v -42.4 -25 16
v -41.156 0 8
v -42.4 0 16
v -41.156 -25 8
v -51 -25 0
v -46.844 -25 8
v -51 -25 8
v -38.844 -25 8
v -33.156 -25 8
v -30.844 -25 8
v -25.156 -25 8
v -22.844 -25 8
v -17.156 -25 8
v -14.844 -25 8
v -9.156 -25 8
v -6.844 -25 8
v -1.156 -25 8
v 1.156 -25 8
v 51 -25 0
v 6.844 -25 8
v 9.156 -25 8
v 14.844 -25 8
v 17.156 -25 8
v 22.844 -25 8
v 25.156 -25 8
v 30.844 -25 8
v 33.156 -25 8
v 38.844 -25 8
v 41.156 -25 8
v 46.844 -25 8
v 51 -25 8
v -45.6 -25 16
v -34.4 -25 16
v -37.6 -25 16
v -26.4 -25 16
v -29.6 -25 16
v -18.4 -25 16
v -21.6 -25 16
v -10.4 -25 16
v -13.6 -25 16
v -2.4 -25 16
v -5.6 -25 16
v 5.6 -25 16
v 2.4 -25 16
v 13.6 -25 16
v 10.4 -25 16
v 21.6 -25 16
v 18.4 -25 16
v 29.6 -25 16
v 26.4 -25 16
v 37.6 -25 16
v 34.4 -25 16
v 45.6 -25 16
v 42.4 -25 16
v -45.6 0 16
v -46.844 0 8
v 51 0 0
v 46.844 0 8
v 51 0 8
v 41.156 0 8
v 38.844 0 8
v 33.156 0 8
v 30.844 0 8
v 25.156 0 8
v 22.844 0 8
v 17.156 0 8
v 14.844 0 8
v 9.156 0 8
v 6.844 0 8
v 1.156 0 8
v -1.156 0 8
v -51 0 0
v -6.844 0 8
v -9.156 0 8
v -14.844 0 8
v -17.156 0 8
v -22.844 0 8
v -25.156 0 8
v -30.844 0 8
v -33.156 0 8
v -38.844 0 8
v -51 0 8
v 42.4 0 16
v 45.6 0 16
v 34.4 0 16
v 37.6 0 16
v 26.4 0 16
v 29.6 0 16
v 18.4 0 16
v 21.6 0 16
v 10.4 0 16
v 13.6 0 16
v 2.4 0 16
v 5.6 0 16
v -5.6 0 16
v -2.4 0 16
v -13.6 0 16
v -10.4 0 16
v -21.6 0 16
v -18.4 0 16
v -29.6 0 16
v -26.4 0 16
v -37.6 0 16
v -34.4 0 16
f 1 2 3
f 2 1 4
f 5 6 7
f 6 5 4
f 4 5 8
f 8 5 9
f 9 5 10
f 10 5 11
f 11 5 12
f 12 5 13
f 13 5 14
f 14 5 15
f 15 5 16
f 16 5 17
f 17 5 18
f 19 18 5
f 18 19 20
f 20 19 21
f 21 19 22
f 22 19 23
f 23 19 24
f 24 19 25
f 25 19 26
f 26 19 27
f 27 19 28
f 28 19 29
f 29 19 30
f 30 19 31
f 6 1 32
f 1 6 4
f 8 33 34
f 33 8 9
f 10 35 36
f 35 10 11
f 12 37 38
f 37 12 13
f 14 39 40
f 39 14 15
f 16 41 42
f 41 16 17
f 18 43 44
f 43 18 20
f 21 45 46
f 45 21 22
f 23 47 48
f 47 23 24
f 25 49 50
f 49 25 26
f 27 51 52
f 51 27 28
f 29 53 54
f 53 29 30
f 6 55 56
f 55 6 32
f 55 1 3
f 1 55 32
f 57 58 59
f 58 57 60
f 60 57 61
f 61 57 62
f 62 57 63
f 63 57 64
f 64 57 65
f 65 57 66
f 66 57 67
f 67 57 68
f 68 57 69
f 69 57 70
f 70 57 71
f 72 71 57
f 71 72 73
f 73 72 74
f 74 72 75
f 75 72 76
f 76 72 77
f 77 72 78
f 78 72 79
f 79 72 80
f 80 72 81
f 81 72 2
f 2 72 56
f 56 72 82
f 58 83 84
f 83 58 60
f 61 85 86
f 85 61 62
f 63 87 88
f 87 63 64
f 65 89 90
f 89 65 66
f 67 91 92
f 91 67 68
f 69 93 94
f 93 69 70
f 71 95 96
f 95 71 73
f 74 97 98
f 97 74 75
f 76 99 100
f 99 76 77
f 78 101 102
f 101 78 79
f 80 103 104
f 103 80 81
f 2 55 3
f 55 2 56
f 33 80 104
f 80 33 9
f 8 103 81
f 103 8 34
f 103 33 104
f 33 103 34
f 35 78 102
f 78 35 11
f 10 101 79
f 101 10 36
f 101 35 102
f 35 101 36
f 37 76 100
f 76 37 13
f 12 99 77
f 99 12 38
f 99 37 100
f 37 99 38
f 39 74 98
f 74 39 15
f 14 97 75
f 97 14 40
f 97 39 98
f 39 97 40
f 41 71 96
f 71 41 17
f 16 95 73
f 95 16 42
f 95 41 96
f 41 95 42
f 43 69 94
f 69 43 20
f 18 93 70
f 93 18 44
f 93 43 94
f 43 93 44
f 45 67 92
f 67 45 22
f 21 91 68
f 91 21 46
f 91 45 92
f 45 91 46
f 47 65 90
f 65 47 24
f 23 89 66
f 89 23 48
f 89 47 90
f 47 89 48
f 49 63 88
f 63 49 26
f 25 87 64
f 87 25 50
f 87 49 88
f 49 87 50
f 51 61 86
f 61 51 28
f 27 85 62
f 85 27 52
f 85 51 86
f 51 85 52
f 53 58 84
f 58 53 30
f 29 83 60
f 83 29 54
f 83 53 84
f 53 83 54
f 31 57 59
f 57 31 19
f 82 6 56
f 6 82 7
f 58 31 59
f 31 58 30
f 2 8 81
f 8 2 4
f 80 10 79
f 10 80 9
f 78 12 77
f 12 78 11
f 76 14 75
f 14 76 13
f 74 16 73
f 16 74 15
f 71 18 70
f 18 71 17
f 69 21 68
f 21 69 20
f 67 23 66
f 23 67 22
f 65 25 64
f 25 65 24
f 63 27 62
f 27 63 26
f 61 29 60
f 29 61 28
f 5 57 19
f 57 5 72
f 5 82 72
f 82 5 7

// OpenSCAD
$fn = 32;

// ----------------------------------------------------------------------
// Toothed rack, 12 teeth
// 8 mm pitch, 8 mm teeth
// ----------------------------------------------------------------------

// --- parameters (mm) ---
bar_w = 25;     // bar width (Y)
bar_h = 8;      // bar height (Z)
teeth = 12;     // number of teeth
pitch = 8;      // tooth pitch
tooth_h = 8;    // tooth height above the bar
root_w = 6;     // tooth width at the root
crest_w = 3.2;  // tooth width at the crest

// --- derived feature positions (mm) ---
span = (teeth - 1) * pitch;  // = 88   distance between the outer teeth
bar_l = span + root_w + 8;   // = 102   bar length: teeth plus 4 mm at each end
tooth_x = -span / 2;         // = -44   X of the first tooth
height = bar_h + tooth_h;    // = 16   overall height
feature_centers = [
  [tooth_x + 0 * pitch, -bar_w / 2],
  [tooth_x + 1 * pitch, -bar_w / 2],
  [tooth_x + 2 * pitch, -bar_w / 2],
  [tooth_x + 3 * pitch, -bar_w / 2],
  [tooth_x + 4 * pitch, -bar_w / 2],
  [tooth_x + 5 * pitch, -bar_w / 2],
  [tooth_x + 6 * pitch, -bar_w / 2],
  [tooth_x + 7 * pitch, -bar_w / 2],
  [tooth_x + 8 * pitch, -bar_w / 2],
  [tooth_x + 9 * pitch, -bar_w / 2],
  [tooth_x + 10 * pitch, -bar_w / 2],
  [tooth_x + 11 * pitch, -bar_w / 2]
];   // tooth centre line, drives the tooth loop

// bar with a rack of teeth, one extruded trapezoium per centre
module rack_tooth() {
  linear_extrude(height = bar_w)
    polygon(points = [
      [0, 0],
      [root_w, 0],
      [root_w / 2 + crest_w / 2, tooth_h + 1],
      [root_w / 2 - crest_w / 2, tooth_h + 1]
    ]);
}

union() {
  translate([-bar_l / 2, -bar_w, 0]) cube([bar_l, bar_w, bar_h]);
  for (centre = feature_centers)
    translate([centre[0] - root_w / 2, 0, bar_h - 1]) rotate([90, 0, 0]) rack_tooth();
}
